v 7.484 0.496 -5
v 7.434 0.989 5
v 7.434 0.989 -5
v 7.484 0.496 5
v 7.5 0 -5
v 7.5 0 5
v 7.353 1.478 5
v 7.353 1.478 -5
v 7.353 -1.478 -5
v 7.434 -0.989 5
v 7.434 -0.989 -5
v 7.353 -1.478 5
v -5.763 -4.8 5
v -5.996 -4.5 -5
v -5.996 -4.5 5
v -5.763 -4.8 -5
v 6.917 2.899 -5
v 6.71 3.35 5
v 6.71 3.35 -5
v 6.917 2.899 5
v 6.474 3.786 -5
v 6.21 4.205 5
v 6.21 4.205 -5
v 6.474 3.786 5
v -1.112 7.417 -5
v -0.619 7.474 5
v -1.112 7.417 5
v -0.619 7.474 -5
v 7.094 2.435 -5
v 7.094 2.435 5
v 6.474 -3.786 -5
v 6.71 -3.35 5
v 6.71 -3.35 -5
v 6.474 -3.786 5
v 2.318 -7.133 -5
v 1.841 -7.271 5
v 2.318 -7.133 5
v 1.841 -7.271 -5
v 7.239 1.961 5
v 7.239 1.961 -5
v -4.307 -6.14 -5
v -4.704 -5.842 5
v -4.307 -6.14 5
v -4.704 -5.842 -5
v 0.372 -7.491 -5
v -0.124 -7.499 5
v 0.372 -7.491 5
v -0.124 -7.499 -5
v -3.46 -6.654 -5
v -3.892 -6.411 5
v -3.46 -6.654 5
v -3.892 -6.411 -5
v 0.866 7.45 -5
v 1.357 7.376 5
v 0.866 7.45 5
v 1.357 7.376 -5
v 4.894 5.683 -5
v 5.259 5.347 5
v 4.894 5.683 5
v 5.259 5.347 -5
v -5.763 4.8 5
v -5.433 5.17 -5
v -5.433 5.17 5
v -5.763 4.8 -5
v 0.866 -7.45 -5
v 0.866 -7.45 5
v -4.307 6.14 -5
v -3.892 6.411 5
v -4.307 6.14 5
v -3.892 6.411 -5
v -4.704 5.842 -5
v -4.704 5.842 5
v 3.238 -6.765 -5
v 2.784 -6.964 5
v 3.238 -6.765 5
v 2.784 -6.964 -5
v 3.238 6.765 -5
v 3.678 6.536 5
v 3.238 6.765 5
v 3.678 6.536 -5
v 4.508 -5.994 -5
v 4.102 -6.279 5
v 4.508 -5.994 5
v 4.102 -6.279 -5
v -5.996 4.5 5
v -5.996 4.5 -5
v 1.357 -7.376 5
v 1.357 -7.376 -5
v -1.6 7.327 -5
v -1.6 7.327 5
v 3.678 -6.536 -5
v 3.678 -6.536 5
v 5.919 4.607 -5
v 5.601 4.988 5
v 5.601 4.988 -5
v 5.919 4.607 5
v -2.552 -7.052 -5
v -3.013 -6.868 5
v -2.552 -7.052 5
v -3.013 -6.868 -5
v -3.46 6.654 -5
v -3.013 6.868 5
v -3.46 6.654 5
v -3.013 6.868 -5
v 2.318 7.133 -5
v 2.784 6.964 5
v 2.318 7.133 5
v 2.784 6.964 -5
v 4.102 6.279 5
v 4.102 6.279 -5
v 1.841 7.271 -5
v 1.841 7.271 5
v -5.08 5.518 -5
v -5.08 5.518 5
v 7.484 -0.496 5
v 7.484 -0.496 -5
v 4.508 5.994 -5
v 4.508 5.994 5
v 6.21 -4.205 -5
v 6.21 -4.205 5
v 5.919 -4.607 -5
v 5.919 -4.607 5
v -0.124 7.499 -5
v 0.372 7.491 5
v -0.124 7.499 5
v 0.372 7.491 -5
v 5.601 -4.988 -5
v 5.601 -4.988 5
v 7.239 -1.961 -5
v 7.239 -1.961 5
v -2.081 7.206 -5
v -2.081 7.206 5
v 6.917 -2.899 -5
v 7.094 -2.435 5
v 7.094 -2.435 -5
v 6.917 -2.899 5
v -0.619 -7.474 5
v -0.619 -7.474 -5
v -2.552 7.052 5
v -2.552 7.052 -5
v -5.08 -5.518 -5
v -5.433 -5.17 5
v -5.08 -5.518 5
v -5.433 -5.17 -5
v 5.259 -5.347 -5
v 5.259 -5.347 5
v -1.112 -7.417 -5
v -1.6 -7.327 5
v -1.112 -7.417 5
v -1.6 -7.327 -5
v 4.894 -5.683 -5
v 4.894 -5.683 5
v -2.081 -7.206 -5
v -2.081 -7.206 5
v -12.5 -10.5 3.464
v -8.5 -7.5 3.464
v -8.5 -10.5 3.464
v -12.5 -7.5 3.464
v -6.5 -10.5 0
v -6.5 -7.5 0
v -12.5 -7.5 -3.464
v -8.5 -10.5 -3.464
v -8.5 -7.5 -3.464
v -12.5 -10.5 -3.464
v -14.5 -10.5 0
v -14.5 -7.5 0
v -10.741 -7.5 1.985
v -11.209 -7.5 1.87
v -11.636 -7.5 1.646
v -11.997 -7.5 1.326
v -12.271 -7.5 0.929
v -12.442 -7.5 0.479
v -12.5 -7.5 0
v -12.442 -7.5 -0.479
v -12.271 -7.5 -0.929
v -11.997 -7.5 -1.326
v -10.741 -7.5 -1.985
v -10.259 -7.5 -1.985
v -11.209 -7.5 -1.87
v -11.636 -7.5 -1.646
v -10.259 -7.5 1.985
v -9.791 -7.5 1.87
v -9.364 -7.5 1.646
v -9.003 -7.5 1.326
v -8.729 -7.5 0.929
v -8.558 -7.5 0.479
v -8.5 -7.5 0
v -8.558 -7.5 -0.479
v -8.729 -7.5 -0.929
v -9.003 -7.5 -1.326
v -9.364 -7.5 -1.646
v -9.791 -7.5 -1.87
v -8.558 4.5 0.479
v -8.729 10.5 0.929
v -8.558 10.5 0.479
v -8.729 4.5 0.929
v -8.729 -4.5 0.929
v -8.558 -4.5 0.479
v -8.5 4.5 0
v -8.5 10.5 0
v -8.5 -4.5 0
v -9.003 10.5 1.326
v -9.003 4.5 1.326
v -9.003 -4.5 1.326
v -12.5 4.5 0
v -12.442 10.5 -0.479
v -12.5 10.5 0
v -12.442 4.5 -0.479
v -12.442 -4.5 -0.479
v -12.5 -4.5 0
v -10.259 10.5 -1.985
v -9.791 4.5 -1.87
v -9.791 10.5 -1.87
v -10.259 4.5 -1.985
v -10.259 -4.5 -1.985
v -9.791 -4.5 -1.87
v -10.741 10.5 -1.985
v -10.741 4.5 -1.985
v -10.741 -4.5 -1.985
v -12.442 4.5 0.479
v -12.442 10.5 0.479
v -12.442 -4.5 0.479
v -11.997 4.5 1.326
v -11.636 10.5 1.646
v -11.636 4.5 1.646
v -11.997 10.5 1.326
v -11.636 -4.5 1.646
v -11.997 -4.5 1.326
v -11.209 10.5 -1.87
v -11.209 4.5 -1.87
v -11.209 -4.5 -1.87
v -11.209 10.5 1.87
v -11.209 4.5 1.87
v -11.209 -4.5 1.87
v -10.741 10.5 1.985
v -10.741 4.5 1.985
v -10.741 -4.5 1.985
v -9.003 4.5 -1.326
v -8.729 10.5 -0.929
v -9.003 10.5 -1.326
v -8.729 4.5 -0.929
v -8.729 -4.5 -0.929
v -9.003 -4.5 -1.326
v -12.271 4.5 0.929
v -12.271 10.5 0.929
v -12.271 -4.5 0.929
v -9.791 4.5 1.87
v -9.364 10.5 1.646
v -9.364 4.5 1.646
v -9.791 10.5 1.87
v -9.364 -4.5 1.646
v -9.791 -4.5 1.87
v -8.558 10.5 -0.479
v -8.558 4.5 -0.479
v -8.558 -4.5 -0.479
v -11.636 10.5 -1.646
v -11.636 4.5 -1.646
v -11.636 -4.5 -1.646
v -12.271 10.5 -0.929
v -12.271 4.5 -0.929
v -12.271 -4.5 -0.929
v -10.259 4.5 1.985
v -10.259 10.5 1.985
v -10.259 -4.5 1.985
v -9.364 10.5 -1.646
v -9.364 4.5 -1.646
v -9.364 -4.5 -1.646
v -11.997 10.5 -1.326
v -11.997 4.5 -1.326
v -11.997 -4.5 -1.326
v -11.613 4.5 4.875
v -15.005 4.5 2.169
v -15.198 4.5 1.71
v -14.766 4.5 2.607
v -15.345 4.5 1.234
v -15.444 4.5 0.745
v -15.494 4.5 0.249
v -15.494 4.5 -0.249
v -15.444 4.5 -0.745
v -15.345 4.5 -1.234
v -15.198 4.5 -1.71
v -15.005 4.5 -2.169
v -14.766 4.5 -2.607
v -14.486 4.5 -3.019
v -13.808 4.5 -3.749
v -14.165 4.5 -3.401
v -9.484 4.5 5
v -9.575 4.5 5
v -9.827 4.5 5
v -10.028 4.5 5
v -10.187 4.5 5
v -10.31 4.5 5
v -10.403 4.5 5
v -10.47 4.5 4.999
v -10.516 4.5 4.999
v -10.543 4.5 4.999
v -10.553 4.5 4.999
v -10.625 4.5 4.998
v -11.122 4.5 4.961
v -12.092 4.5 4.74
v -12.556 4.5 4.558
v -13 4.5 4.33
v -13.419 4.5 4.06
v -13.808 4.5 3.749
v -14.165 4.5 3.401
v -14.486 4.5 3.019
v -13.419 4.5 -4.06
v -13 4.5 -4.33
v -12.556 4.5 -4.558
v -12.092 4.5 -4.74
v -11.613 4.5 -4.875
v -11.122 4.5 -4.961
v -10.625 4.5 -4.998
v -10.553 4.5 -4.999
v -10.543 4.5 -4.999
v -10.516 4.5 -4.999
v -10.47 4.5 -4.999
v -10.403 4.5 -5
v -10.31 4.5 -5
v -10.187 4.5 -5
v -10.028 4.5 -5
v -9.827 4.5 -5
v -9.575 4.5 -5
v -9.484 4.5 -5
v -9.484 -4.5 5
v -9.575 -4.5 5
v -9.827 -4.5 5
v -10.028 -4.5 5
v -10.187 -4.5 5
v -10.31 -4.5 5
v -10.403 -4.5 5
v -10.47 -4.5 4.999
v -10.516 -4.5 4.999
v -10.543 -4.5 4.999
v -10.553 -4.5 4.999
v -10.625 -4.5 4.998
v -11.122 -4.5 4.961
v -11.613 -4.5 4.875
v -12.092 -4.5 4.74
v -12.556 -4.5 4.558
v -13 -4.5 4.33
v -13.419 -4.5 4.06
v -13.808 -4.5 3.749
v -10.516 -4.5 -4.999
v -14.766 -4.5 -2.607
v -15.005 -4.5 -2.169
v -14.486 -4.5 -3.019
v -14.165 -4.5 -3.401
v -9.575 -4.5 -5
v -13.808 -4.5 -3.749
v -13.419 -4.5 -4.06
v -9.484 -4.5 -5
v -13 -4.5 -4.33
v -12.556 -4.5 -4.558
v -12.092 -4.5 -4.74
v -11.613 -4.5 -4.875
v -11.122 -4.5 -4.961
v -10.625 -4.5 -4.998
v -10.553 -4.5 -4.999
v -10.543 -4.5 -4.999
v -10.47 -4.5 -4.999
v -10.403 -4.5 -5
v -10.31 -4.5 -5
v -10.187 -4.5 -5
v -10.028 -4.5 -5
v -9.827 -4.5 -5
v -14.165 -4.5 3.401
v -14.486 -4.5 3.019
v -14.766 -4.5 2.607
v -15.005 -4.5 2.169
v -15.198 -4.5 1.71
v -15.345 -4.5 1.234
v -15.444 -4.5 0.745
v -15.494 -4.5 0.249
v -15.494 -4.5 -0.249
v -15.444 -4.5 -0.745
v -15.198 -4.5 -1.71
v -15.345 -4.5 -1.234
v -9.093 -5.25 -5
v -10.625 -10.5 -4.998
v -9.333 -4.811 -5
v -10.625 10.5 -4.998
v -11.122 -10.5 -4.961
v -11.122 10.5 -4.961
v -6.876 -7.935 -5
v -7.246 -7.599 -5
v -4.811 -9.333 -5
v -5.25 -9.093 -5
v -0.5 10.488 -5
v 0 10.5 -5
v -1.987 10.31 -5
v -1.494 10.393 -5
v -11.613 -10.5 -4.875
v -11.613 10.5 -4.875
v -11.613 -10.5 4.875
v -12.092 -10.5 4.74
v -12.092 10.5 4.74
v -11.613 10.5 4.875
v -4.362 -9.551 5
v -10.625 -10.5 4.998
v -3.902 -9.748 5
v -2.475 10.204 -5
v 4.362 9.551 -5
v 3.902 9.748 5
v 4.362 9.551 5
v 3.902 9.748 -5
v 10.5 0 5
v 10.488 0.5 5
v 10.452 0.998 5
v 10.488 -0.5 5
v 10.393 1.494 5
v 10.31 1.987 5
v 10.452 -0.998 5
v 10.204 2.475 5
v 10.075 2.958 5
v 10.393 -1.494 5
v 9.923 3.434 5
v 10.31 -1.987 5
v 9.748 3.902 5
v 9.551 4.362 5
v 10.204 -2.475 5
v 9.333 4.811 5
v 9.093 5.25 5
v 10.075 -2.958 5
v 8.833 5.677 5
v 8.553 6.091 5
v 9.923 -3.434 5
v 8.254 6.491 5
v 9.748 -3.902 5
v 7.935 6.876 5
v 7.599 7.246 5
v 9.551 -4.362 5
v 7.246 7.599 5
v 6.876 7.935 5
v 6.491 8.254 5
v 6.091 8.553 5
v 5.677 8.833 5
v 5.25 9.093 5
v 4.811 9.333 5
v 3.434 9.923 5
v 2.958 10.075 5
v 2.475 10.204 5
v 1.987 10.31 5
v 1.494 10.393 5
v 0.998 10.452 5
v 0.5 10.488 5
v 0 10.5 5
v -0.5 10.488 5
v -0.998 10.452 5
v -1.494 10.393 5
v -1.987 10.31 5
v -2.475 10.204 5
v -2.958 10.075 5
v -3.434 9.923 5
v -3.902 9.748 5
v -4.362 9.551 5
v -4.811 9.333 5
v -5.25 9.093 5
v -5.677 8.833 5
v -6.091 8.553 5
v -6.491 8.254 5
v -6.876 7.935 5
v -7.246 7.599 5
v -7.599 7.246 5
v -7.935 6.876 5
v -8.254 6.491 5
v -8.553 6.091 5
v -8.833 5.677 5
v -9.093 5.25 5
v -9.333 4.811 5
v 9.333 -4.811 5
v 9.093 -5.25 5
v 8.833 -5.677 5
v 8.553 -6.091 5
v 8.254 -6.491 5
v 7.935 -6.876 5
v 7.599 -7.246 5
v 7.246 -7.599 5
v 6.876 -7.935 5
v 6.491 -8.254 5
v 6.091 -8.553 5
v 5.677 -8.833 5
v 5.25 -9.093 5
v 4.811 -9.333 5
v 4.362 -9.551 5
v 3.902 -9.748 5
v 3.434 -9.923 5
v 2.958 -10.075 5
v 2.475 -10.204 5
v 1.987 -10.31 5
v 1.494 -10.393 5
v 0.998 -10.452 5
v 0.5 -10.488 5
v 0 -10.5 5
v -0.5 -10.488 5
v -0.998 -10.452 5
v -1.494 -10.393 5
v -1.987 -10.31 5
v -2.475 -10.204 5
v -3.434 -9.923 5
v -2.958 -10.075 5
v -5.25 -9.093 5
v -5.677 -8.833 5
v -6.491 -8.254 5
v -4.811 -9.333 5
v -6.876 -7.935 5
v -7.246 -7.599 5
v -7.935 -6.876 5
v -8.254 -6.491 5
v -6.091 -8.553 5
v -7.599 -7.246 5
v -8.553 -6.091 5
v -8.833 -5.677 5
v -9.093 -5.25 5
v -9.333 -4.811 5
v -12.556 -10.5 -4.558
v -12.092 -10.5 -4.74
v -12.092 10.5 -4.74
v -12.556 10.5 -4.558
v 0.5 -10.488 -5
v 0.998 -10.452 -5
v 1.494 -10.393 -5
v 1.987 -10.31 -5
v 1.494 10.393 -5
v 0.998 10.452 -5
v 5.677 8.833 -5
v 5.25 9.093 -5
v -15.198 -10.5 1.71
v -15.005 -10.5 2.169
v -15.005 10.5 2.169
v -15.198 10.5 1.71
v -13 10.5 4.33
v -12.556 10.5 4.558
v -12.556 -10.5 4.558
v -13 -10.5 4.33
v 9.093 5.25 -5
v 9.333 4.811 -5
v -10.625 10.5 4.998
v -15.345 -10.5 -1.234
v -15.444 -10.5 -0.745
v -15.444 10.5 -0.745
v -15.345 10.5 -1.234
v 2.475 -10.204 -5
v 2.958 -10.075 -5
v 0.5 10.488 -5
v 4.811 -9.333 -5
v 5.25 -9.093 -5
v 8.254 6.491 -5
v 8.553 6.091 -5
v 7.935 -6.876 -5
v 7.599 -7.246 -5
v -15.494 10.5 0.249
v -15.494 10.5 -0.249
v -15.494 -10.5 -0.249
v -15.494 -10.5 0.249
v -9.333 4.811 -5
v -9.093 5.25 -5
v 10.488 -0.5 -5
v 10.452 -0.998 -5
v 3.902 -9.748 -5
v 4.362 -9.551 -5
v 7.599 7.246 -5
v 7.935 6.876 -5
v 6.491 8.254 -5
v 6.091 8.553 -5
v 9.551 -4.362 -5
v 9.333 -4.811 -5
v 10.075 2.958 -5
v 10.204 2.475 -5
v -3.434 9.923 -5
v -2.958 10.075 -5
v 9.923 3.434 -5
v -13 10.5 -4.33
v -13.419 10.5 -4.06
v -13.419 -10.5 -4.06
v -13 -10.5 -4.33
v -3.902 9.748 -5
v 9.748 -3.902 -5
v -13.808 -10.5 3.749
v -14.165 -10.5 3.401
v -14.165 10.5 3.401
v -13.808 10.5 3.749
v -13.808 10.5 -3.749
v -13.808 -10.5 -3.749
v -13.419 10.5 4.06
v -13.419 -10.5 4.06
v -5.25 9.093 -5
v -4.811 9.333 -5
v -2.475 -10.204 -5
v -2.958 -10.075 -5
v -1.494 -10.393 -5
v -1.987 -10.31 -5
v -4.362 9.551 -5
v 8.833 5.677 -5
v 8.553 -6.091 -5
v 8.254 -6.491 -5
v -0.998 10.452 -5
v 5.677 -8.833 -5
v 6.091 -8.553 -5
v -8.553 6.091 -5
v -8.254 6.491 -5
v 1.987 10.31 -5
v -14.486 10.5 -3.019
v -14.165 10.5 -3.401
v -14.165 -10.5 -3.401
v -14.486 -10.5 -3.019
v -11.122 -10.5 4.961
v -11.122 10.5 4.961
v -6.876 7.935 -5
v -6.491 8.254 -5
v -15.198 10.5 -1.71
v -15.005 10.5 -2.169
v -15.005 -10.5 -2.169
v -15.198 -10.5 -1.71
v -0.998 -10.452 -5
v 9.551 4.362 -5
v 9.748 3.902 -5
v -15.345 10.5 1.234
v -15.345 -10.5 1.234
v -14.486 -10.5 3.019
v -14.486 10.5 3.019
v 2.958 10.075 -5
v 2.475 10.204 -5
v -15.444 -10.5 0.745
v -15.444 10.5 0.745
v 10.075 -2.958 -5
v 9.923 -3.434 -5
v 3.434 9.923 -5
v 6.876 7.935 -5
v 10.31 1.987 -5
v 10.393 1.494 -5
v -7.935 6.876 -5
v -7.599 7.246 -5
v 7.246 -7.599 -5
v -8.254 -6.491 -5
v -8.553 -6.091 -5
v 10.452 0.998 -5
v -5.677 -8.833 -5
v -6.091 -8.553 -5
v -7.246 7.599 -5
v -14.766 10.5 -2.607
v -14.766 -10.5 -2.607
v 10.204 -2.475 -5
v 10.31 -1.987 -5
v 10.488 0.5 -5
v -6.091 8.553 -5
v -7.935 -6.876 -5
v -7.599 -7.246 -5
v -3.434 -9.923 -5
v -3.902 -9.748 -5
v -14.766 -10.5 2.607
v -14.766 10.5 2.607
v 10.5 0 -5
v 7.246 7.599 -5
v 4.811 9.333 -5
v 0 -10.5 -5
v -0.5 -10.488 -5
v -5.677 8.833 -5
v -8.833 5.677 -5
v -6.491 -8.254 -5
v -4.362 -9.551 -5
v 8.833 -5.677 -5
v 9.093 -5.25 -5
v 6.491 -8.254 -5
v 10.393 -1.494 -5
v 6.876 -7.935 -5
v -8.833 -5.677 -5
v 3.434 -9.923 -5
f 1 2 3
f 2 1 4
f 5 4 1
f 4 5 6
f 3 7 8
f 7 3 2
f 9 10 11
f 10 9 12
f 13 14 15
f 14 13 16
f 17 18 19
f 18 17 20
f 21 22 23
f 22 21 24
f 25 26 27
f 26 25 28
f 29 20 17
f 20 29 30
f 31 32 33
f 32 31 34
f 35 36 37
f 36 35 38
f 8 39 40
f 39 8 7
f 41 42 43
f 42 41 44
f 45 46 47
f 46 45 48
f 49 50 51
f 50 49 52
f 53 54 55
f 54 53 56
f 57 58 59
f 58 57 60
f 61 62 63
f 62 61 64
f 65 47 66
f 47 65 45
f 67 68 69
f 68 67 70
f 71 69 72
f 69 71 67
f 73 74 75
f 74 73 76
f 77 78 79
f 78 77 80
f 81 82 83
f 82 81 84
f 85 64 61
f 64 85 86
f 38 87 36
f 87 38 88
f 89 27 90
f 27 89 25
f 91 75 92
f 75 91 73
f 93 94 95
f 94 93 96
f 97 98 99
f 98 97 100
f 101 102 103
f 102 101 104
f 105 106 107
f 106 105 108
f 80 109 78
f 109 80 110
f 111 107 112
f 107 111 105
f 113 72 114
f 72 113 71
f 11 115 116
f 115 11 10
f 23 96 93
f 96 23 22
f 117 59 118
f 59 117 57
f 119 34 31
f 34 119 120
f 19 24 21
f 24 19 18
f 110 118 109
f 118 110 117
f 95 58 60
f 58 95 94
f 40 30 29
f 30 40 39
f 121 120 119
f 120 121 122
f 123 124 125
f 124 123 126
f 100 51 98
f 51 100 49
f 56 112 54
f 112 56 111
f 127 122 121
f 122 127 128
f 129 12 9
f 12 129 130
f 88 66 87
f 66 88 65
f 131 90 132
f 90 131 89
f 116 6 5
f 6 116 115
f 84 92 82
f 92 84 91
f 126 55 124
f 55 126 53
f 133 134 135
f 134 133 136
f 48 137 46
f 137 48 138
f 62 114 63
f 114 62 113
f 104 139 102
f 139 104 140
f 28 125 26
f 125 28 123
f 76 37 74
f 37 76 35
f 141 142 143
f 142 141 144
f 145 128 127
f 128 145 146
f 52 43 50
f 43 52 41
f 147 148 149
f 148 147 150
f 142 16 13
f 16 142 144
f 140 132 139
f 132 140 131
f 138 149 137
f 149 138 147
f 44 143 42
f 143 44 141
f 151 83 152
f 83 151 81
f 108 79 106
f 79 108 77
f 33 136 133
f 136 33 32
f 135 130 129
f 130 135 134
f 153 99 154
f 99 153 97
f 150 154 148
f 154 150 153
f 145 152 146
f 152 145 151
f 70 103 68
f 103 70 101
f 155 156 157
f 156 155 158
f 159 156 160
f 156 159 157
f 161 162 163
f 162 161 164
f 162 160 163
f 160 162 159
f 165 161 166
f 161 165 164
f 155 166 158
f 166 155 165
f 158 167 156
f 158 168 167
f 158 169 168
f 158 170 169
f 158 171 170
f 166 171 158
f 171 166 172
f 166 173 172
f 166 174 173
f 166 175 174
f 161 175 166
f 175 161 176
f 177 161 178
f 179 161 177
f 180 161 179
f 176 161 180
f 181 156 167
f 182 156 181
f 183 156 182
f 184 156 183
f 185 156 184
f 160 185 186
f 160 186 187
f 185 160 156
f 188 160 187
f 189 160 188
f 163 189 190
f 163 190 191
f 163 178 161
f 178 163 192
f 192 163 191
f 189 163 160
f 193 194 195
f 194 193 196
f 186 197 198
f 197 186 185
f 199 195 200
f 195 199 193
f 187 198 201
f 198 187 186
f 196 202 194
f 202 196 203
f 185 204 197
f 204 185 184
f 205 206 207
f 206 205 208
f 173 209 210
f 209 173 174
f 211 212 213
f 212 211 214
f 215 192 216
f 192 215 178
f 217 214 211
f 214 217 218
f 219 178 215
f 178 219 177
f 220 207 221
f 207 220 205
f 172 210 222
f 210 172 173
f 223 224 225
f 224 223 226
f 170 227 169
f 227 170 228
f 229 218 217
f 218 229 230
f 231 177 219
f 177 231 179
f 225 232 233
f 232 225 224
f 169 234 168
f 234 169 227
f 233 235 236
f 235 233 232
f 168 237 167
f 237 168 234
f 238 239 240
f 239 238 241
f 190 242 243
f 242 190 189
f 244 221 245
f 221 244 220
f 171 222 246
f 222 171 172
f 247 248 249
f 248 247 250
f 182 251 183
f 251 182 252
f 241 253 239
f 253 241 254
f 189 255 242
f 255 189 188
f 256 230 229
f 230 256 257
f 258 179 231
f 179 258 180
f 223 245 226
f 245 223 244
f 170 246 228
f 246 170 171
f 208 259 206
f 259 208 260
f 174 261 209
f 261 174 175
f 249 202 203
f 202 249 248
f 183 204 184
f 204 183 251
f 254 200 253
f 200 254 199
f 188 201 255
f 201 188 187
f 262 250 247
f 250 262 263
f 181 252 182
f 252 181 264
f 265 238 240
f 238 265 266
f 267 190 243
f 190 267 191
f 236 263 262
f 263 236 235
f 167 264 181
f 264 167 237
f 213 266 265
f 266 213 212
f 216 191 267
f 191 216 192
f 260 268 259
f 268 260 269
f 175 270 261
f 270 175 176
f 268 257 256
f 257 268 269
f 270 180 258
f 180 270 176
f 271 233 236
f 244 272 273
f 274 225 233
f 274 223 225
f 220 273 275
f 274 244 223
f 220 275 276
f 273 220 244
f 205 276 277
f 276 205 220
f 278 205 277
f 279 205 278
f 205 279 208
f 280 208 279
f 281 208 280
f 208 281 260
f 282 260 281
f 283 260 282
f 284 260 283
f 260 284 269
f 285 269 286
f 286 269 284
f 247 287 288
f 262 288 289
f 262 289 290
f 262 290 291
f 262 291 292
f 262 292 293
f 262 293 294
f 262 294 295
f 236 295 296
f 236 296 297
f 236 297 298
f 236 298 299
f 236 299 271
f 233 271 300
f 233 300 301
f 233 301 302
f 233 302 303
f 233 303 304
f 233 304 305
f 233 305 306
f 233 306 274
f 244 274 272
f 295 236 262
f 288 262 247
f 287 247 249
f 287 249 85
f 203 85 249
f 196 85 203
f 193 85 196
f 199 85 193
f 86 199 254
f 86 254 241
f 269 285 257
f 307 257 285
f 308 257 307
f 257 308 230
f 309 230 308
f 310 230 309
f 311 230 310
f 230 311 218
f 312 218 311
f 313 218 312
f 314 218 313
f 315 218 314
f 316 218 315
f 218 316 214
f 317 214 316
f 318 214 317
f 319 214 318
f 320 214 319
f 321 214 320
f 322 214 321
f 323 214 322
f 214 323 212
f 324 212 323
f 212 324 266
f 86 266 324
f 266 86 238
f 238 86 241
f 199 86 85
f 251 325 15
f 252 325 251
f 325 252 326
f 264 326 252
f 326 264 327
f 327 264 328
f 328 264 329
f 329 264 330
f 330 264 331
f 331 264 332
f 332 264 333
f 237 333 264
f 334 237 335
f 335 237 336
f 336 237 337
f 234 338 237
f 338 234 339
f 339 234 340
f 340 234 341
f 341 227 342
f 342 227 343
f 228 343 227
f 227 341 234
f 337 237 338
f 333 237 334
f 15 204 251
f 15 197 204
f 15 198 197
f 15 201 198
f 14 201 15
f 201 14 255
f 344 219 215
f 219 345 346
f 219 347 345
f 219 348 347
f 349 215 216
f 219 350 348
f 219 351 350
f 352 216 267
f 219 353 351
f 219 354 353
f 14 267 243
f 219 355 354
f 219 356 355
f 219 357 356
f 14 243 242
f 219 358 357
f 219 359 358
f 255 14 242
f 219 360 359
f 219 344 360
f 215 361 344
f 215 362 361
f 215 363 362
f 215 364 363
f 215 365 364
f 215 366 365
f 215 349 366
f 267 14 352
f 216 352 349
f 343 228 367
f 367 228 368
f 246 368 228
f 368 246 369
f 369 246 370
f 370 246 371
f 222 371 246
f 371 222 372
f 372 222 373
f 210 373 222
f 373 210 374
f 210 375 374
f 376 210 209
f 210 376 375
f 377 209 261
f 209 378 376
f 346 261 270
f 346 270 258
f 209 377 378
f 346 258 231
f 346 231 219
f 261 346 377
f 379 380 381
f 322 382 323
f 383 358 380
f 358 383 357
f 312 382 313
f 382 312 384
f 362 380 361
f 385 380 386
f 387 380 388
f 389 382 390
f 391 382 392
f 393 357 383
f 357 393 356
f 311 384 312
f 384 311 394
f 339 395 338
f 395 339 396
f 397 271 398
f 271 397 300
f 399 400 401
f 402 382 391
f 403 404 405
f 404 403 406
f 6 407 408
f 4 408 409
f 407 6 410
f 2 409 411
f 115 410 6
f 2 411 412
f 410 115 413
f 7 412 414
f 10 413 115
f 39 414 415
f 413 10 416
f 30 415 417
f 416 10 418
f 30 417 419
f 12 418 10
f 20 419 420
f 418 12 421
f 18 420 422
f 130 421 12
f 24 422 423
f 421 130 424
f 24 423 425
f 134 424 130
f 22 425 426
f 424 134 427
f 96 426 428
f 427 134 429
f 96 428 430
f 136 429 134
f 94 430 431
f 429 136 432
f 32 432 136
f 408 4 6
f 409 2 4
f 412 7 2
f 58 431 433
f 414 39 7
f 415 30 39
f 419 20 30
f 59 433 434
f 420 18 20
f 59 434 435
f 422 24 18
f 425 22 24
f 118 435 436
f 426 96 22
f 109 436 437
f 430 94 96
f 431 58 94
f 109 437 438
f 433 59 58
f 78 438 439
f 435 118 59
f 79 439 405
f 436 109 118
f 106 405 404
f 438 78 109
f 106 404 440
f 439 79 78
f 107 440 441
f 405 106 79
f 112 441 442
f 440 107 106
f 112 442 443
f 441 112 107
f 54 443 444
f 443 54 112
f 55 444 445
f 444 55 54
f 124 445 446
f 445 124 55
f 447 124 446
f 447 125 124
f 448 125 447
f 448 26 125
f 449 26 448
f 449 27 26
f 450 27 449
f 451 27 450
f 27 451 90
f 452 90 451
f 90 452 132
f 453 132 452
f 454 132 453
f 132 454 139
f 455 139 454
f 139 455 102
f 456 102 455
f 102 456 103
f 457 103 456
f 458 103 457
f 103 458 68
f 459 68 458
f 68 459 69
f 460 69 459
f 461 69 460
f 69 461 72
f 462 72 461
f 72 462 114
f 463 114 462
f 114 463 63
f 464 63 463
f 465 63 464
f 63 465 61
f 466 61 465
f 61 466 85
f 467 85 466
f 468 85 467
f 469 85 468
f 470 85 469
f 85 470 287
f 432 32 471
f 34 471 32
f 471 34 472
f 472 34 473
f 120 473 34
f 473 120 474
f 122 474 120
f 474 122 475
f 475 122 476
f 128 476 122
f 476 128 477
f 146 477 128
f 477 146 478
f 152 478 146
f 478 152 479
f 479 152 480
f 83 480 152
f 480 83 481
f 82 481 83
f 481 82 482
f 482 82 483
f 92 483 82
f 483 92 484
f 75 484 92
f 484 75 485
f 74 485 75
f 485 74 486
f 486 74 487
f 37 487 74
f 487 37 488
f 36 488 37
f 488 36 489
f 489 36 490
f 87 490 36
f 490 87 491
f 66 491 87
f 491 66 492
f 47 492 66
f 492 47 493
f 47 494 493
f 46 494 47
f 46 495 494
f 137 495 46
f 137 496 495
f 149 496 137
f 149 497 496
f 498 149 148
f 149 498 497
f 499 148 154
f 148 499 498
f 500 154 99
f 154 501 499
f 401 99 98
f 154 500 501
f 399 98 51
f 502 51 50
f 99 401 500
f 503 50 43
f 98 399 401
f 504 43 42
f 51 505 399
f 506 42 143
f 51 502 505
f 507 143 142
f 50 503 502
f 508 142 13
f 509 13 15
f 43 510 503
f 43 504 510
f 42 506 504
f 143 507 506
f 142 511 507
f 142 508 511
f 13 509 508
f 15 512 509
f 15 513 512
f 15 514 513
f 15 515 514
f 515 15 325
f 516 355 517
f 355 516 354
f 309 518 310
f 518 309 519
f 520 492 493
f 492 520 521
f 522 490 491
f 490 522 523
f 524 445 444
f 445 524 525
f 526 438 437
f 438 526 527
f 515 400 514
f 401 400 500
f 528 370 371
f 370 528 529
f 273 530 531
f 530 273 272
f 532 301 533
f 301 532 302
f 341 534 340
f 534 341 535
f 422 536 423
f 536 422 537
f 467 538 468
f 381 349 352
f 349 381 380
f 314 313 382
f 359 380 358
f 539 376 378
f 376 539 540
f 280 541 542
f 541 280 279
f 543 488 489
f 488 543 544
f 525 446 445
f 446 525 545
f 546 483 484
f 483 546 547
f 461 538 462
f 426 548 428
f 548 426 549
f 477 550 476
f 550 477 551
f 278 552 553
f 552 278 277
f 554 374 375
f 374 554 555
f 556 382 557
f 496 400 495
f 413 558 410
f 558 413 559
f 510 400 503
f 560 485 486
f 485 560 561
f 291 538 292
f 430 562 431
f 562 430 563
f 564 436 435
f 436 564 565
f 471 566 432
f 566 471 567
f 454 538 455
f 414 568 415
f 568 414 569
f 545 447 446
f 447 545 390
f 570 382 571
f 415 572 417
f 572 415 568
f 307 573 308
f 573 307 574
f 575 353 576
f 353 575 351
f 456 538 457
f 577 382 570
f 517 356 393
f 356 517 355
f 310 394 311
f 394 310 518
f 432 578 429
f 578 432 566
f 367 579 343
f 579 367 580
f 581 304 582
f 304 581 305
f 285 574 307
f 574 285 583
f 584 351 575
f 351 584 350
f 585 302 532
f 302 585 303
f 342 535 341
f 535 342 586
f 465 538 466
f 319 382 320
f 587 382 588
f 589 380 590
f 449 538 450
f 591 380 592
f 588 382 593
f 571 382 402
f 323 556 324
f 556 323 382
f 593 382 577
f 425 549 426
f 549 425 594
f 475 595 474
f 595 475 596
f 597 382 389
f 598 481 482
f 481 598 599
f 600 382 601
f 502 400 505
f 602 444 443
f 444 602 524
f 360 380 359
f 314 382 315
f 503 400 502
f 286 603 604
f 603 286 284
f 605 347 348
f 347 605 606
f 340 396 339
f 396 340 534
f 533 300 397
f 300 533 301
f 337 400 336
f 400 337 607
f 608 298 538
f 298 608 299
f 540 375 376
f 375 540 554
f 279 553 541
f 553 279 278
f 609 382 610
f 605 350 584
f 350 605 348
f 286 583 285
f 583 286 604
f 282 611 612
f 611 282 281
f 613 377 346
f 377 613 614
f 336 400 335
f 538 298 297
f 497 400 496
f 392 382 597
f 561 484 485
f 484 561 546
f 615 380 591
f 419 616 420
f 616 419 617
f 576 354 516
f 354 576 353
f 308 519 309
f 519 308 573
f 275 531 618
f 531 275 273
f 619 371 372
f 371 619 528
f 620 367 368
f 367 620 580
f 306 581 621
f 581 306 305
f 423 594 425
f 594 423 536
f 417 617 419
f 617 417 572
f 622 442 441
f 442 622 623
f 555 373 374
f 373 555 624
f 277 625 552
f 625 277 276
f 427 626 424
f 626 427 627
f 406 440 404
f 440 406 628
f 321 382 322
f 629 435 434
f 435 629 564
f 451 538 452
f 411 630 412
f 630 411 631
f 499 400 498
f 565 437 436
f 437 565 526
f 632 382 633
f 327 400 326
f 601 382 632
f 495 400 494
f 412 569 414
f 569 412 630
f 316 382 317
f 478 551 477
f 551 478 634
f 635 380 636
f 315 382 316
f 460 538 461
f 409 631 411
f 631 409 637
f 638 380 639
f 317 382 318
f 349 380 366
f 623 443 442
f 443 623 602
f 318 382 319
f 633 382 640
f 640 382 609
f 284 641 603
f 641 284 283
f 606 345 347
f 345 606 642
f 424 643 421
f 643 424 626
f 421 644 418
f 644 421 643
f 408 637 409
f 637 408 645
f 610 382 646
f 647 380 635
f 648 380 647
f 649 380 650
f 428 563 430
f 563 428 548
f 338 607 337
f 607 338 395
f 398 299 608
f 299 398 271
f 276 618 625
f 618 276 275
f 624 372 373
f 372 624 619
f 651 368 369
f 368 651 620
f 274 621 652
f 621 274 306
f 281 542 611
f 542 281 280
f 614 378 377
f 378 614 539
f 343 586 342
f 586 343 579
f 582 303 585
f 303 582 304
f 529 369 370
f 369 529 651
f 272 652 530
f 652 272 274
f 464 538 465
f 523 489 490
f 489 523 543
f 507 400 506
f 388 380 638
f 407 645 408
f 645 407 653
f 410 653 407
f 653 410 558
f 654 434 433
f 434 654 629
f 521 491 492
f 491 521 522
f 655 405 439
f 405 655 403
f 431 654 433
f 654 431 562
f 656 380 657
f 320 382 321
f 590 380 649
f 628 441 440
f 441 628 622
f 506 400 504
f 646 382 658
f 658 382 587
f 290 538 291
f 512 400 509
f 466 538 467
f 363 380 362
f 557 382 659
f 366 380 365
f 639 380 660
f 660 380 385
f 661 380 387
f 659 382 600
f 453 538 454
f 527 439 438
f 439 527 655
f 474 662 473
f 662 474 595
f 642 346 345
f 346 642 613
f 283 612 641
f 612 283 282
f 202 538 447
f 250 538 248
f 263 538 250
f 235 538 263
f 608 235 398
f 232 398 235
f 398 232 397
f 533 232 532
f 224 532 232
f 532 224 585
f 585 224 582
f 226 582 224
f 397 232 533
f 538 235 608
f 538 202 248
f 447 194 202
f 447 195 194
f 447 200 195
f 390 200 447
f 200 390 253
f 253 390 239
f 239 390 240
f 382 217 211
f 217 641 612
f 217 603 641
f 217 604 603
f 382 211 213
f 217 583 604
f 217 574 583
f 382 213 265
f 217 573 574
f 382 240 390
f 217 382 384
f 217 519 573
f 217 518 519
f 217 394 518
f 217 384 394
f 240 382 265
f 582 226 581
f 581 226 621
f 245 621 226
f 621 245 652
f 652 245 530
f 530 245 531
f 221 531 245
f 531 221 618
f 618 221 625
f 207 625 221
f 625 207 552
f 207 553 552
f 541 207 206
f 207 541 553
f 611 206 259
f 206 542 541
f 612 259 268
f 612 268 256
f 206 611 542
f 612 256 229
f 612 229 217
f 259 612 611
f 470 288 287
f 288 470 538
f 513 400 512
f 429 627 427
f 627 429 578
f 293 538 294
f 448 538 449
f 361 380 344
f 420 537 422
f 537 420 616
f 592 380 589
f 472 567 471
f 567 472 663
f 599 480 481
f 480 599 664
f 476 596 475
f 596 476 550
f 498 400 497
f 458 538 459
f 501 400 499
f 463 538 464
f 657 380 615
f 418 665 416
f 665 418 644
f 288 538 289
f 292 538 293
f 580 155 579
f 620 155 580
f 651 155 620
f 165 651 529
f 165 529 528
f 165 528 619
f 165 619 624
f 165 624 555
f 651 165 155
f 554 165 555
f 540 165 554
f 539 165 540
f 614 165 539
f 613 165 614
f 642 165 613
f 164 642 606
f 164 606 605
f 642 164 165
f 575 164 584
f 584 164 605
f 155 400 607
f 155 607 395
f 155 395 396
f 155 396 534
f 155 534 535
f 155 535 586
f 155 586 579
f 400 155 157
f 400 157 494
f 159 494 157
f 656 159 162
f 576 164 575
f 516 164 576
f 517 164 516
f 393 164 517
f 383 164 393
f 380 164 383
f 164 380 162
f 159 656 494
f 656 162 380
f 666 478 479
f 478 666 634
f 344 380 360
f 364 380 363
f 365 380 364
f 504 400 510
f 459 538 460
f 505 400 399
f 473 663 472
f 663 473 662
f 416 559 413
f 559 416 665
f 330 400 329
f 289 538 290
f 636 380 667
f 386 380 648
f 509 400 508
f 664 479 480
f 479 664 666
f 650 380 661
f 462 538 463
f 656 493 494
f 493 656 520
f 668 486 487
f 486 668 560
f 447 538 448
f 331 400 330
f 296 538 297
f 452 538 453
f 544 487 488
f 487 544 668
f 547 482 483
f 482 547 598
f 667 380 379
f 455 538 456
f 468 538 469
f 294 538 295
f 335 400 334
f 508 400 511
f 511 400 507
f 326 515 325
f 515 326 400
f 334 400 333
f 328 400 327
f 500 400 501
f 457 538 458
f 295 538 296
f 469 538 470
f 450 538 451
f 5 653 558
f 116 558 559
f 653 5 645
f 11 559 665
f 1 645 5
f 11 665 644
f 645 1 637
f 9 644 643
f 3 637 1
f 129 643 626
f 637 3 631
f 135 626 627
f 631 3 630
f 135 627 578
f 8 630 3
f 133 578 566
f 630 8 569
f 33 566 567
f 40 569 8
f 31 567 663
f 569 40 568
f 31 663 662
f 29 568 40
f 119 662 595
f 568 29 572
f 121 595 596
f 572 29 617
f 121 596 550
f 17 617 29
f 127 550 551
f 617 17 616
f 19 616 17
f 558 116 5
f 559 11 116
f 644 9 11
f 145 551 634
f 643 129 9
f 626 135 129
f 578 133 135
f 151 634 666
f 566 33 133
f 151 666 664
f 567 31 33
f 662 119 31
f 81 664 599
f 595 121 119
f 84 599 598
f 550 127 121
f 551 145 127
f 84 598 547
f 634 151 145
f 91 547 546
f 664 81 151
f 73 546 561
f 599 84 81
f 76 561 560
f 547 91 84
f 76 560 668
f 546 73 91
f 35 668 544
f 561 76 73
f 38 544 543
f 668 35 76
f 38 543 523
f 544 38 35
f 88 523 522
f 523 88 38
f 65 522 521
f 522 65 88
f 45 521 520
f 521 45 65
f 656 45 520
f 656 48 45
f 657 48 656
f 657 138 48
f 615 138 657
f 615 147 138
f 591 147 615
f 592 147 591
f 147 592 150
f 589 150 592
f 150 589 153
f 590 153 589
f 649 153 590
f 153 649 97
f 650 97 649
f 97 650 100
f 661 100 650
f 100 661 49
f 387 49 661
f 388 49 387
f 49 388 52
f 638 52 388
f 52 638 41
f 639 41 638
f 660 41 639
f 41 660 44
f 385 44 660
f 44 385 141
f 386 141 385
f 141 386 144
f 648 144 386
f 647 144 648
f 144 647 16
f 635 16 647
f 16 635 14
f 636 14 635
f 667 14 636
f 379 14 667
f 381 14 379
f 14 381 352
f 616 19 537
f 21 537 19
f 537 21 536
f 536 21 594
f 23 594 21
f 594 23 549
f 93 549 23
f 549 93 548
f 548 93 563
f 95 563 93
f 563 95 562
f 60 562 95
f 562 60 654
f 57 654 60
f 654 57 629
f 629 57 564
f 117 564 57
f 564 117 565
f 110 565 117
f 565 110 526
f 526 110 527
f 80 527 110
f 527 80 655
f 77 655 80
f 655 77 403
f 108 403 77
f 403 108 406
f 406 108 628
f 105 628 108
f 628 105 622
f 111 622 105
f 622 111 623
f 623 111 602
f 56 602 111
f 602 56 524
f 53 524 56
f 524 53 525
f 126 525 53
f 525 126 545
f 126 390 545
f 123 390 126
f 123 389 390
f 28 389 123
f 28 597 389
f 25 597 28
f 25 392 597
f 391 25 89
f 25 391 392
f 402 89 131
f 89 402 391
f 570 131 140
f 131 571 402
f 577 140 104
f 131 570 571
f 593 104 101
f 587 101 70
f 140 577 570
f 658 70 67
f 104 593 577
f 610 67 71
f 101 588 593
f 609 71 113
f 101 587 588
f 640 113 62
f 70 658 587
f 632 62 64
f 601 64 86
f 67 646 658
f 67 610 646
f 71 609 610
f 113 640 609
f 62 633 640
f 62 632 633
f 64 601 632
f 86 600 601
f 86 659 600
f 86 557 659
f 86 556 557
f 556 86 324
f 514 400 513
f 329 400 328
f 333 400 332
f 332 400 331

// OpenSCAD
// Double clamps for mounting stuff on camera rails
// Customizations allow to use this single parametric model to generate most of
// the rail mounts for my rig. Make neighboring tightener thumb screws face
// different directions for ease of their use in otherwise tight space Mount
// objects above or below the clamp Move the mounting height by changing the
// position of connecting bar between rail clamps Coupling option allows to
// attach Hirth joint rosette and use it for example for clamping to another
// tube I'm using m4 screws in 10x10mm grid in my diy rigs, if you want more
// standard 1/4" screws with 9x9mm grid just change d_bolt to 6.5 and
// hole_distance to 9
$fa = 1 / 1;
$fs = 1 / 2;
bissl = 1 / 100;
part = "single_clamp";//[double_clamp,double_clamp_side,double_clamp_double_mount,lens_suppoprt_clamp,lens_support]
/* [hardware size] */
d_tube = 15;
h_ring = 10;
d_bolt = 4;
d_nut = 8;
h_nut = 3;
/* [coupling size] */
coupling = false;
bcd = 10;
n_screws = 4;
d_circle = 2;
/* [general part parameters] */
wall = 3;
offset = 1;
center_to_center = 60;
bar_thickness = 6;
n_holes = 3;
hole_distance = 10;
/* [lens support] */
range = 30;
width = 20;
maxlens = 82;
/* [part shape tweaks] */
nut = true;
invert_nut_side = false;
tightener_facing = "up"; //[down,side,diagonally_up,diagonally_down,diagonally_inwards]
angle = tightener_facing == "up"                   ? 180
        : tightener_facing == "diagonally_up"      ? 135
        : tightener_facing == "side"               ? 90
        : tightener_facing == "diagonally_down"    ? 45
        : tightener_facing == "down"               ? 0
        : tightener_facing == "diagonally_inwards" ? -150
                                                   : undef;
nut_side_up =
    (tightener_facing == "up" || tightener_facing == "diagonally_up" ||
     tightener_facing == "diagonally_inwards");
reflections = invert_nut_side ? [ !nut_side_up, nut_side_up ]
                              : [ nut_side_up, !nut_side_up ];
orientations = [ -angle, angle ];
bar_position = "low";  //[mid,up,just_clear_nut]
mount_object = "down"; //[up,down]
bar_orientation = mount_object == "down" ? 180
                  : mount_object == "up" ? 0
                                         : undef;
bar_offset =
    bar_position == "low"   ? bar_thickness / 2 - d_tube / 2 - wall
    : bar_position == "mid" ? 0
    : bar_position == "up"  ? -bar_thickness / 2 + d_tube / 2 + wall
    : nut_side_up
        ? d_tube / 2 + offset + d_bolt / 2 - d_nut / 2 - bar_thickness / 2
        : -d_tube / 2 - offset - d_bolt / 2 + d_nut / 2 + bar_thickness / 2;

module single_clamp() {
  difference() {
    union() {
      hull() {
        translate([ d_tube / 2, 0, 0 ])
            cylinder(h = h_ring, d = d_tube + 2 * wall, center = true);
        translate([ -d_bolt / 2 - offset, 0, 0 ]) rotate([ 90, 0, 0 ])
            cylinder(h = d_tube + 2 * wall, d = h_ring, center = true);
      }
    }
    translate([ d_tube / 2, 0, 0 ])
        cylinder(h = d_tube + 2 * wall + bissl, d = d_tube, center = true);
    if (nut)
      translate([ -d_bolt / 2 - offset, -d_tube / 2, 0 ]) rotate([ 90, 0, 0 ])
          cylinder(h = d_tube + 2 * wall + bissl, d = d_nut, $fn = 6);
    if (coupling)
      translate([ -d_bolt / 2 - offset, d_tube / 2 + wall, 0 ])
          rotate([ 90, 0, 0 ]) for (i = [180 / n_screws:360 / n_screws:360])
              rotate([ 0, 0, i ]) translate([ bcd / 2, 0, -0.01 ])
                  cylinder(h = 2 * wall + 0.02, d = d_circle);
    translate([ -d_bolt / 2 - offset, 0, 0 ]) rotate([ 90, 0, 0 ])
        cylinder(h = d_tube + 2 * wall + bissl, d = d_bolt, center = true);
    translate([
      -d_bolt / 2 - h_ring / 2 - bissl - offset, -d_tube / 2 + wall,
      -h_ring / 2 -
      bissl
    ])
        cube([
          d_bolt / 2 + h_ring / 2 + d_tube / 2 + offset, d_tube - 2 * wall,
          h_ring + 2 *
          bissl
        ]);
  }
}
module double_clamp() {
  difference() {
    union() {
      hull() {
        translate([ d_tube / 2, 0, 0 ])
            cylinder(h = h_ring, d = d_tube + 2 * wall, center = true);
        translate([ -d_bolt / 2 - offset, 0, 0 ]) rotate([ 90, 0, 0 ])
            cylinder(h = d_tube + 2 * wall, d = h_ring, center = true);
      }
      translate([ 0, center_to_center, 0 ]) hull() {
        translate([ d_tube / 2, 0, 0 ])
            cylinder(h = h_ring, d = d_tube + 2 * wall, center = true);
        translate([ -d_bolt / 2 - offset, 0, 0 ]) rotate([ 90, 0, 0 ])
            cylinder(h = d_tube + 2 * wall, d = h_ring, center = true);
      }
      translate([ d_tube + wall - bar_thickness, 0, -h_ring / 2 ])
          cube([ bar_thickness, center_to_center, h_ring ]);
    }
    translate([ d_tube / 2, 0, 0 ])
        cylinder(h = d_tube + 2 * wall + bissl, d = d_tube, center = true);
    translate([ d_tube / 2, center_to_center, 0 ])
        cylinder(h = d_tube + 2 * wall + bissl, d = d_tube, center = true);
    if (nut)
      translate([ -d_bolt / 2 - offset, -d_tube / 2 + center_to_center, 0 ])
          rotate([ 90, 0, 0 ]) cylinder(h = wall + bissl, d = d_nut, $fn = 6);
    if (nut)
      translate([ -d_bolt / 2 - offset, d_tube / 2 + wall + bissl, 0 ])
          rotate([ 90, 0, 0 ]) cylinder(h = wall + bissl, d = d_nut, $fn = 6);
    translate([ -d_bolt / 2 - offset, 0, 0 ]) rotate([ 90, 0, 0 ])
        cylinder(h = d_tube + 2 * wall + bissl, d = d_bolt, center = true);
    translate([ -d_bolt / 2 - offset, center_to_center, 0 ])
        rotate([ 90, 0, 0 ])
            cylinder(h = d_tube + 2 * wall + bissl, d = d_bolt, center = true);
    translate([
      -d_bolt / 2 - h_ring / 2 - bissl - offset, -d_tube / 2 + wall,
      -h_ring / 2 -
      bissl
    ])
        cube([
          d_bolt / 2 + h_ring / 2 + d_tube / 2 + offset, d_tube - 2 * wall,
          h_ring + 2 *
          bissl
        ]);
    translate([
      -d_bolt / 2 - h_ring / 2 - bissl - offset,
      -d_tube / 2 + wall + center_to_center, -h_ring / 2 -
      bissl
    ])
        cube([
          d_bolt / 2 + h_ring / 2 + d_tube / 2 + offset, d_tube - 2 * wall,
          h_ring + 2 *
          bissl
        ]);
    for (i = [ 20, 30, 40 ]) {
      translate([ -bar_thickness + d_tube + wall - bissl, i, 0 ])
          rotate([ 90, 0, 90 ]) cylinder(d = d_nut, h = h_nut, $fn = 6);
      translate([ -bar_thickness + d_tube + wall - bissl, i, 0 ])
          rotate([ 90, 0, 90 ]) cylinder(d = d_bolt, bar_thickness + 2 * bissl);
    }
  }
}
module double_clamp_wall() {
  bar_thickness = 5;
  h_ring = 12;
  difference() {
    union() {
      hull() {
        translate([ d_tube / 2, 0, 0 ])
            cylinder(h = h_ring, d = d_tube + 2 * wall, center = true);
        translate([ -d_bolt / 2 - offset, 0, 0 ]) rotate([ 90, 0, 0 ])
            cylinder(h = d_tube + 2 * wall, d = h_ring, center = true);
      }
      translate([ 0, center_to_center, 0 ]) hull() {
        translate([ d_tube / 2, 0, 0 ])
            cylinder(h = h_ring, d = d_tube + 2 * wall, center = true);
        translate([ -d_bolt / 2 - offset, 0, 0 ]) rotate([ 90, 0, 0 ])
            cylinder(h = d_tube + 2 * wall, d = h_ring, center = true);
      }
      translate([ d_tube / 2, 0, -h_ring / 2 ]) hull() {
        for (t = [
               [ -85 + 31 + 5, 10, 0 ], [ -85 + 31 + 5, 50, 0 ], [ 0, 10, 0 ],
               [ 0, 50, 0 ]
             ])
          translate(t) cylinder(d = 10, h = bar_thickness);
      }
    }
    translate([ d_tube / 2, 0, -h_ring / 2 -
                bissl ]) for (t =
                                  [
                                    [ -85 + 31 + 5, 10, 0 ],
                                    [ -85 + 31 + 5, 30, 0 ],
                                    [ -85 + 31 + 5, 50, 0 ]
                                  ]) translate(t)
        cylinder(d = d_bolt, h = bar_thickness + 2 * bissl);

    translate([ d_tube / 2, 0, 0 ])
        cylinder(h = d_tube + 2 * wall + bissl, d = d_tube, center = true);
    translate([ d_tube / 2, center_to_center, 0 ])
        cylinder(h = d_tube + 2 * wall + bissl, d = d_tube, center = true);
    if (nut)
      translate([ -d_bolt / 2 - offset, -d_tube / 2 + center_to_center, 0 ])
          rotate([ 90, 0, 0 ])
              cylinder(h = wall + h_nut * 2, d = d_nut, $fn = 6);
    if (nut)
      translate([ -d_bolt / 2 - offset, d_tube / 2, 0 ]) rotate([ -90, 0, 0 ])
          cylinder(h = wall + h_nut * 2, d = d_nut, $fn = 6);
    translate([ -d_bolt / 2 - offset, 0, 0 ]) rotate([ 90, 0, 0 ])
        cylinder(h = d_tube + 2 * wall + bissl, d = d_bolt, center = true);
    translate([ -d_bolt / 2 - offset, center_to_center, 0 ])
        rotate([ 90, 0, 0 ])
            cylinder(h = d_tube + 2 * wall + bissl, d = d_bolt, center = true);
    translate([
      -d_bolt / 2 - h_ring / 2 - bissl - offset, -d_tube / 2 + wall,
      -h_ring / 2 -
      bissl
    ])
        cube([
          d_bolt / 2 + h_ring / 2 + d_tube / 2 + offset, d_tube - 2 * wall,
          h_ring + 2 *
          bissl
        ]);
    translate([
      -d_bolt / 2 - h_ring / 2 - bissl - offset,
      -d_tube / 2 + wall + center_to_center, -h_ring / 2 -
      bissl
    ])
        cube([
          d_bolt / 2 + h_ring / 2 + d_tube / 2 + offset, d_tube - 2 * wall,
          h_ring + 2 *
          bissl
        ]);
  }
}

module clamp_positive(d_tube = 16, h_ring = 12, wall = 3, d_bolt = 4,
                      offset = 1) {
  hull() {
    translate([ 0, 0, 0 ])
        cylinder(h = h_ring, d = d_tube + 2 * wall, center = true);
    translate([ -d_bolt / 2 - offset - d_tube / 2, 0, 0 ]) rotate([ 90, 0, 0 ])
        cylinder(h = d_tube + 2 * wall, d = h_ring, center = true);
  }
}

module clamp_negative(d_tube = 16, h_ring = 12, wall = 3, d_bolt = 4,
                      offset = 1, nut = true, d_nut = 8, coupling = false,
                      bcd = 10, n_screws = 4, d_circle = 2) {
  cylinder(h = d_tube + 2 * wall + bissl, d = d_tube, center = true);
  if (nut)
    translate(
        [ -d_bolt / 2 - offset - d_tube / 2, -wall - d_tube / 2 - bissl, 0 ])
        rotate([ -90, 0, 0 ]) cylinder(h = h_nut + bissl, d = d_nut, $fn = 6);
  if (coupling)
    translate([ -d_bolt / 2 - offset - d_tube / 2, d_tube / 2 + wall, 0 ])
        rotate([ 90, 0, 0 ]) for (i = [180 / n_screws:360 / n_screws:360])
            rotate([ 0, 0, i ]) translate([ bcd / 2, 0, -0.01 ])
                cylinder(h = 2 * wall + 0.02, d = d_circle);
  translate([ -d_bolt / 2 - offset - d_tube / 2, 0, 0 ]) rotate([ 90, 0, 0 ])
      cylinder(h = d_tube + 2 * wall + bissl, d = d_bolt, center = true);
  translate([
    -d_bolt / 2 - h_ring / 2 - bissl - offset - d_tube / 2, -d_tube / 2 + wall,
    -h_ring / 2 -
    bissl
  ])
      cube([
        d_bolt / 2 + h_ring / 2 + d_tube / 2 + offset, d_tube - 2 * wall,
        h_ring + 2 *
        bissl
      ]);
}
module clamp(d_tube = 16, h_ring = 12, wall = 3, d_bolt = 4, offset = 1,
             nut = true, d_nut = 8, coupling = false, bcd = 10, n_screws = 4,
             d_circle = 2) {
  difference() {
    clamp_positive(d_tube = d_tube, h_ring = h_ring, wall = wall,
                   d_bolt = d_bolt, offset = offset);
    clamp_negative(d_tube = d_tube, h_ring = h_ring, wall = wall,
                   d_bolt = d_bolt, offset = offset, nut = nut, d_nut = d_nut,
                   coupling = coupling, bcd = bcd, n_screws = n_screws,
                   d_circle = d_circle);
  }
}
module clamp_double(d_tube = 16, h_ring = 12, wall = 3, d_bolt = 4, offset = 1,
                    nut = true, d_nut = 8, h_nut = 4, coupling = false,
                    bcd = 10, n_screws = 4, d_circle = 2, center_to_center = 60,
                    orientations = [ 0, 0 ], reflections = [ false, true ],
                    bar_thickness = 8, bar_offset = 5, n_holes = 3,
                    hole_distance = 10, bar_orientation = 0) {
  difference() {
    union() {
      translate([ 0, center_to_center / 2, 0 ])
          rotate([ 0, 0, orientations[0] ])
              clamp_positive(d_tube = d_tube, h_ring = h_ring, wall = wall,
                             d_bolt = d_bolt, offset = offset);
      translate([ 0, -center_to_center / 2, 0 ])
          rotate([ 0, 0, orientations[1] ])
              clamp_positive(d_tube = d_tube, h_ring = h_ring, wall = wall,
                             d_bolt = d_bolt, offset = offset);
      translate([ bar_offset, 0, 0 ]) rotate([ 0, bar_orientation, 0 ]) bar(
          bar_thickness = bar_thickness, center_to_center = center_to_center,
          bar_width = h_ring, hole_distance = hole_distance, n_holes = n_holes,
          d_bolt = d_bolt, d_nut = d_nut, h_nut = h_nut);
    }
    translate([ 0, center_to_center / 2, 0 ]) rotate([ 0, 0, orientations[0] ])
        mirror([ 0, reflections[0] ? 1 : 0, 0 ])
            clamp_negative(d_tube = d_tube, h_ring = h_ring, wall = wall,
                           d_bolt = d_bolt, offset = offset, nut = nut,
                           d_nut = d_nut, coupling = coupling, bcd = bcd,
                           n_screws = n_screws, d_circle = d_circle);
    translate([ 0, -center_to_center / 2, 0 ]) rotate([ 0, 0, orientations[1] ])
        mirror([ 0, reflections[1] ? 1 : 0, 0 ])
            clamp_negative(d_tube = d_tube, h_ring = h_ring, wall = wall,
                           d_bolt = d_bolt, offset = offset, nut = nut,
                           d_nut = d_nut, coupling = coupling, bcd = bcd,
                           n_screws = n_screws, d_circle = d_circle);
  }
}
module bar(bar_thickness = 6, center_to_center = 60, bar_width = 16,
           hole_distance = 10, n_holes = 5, d_bolt = 4, d_nut = 8, h_nut = 4) {
  difference() {
    cube([ bar_thickness, center_to_center, bar_width ], center = true);
    for (t = [-hole_distance * (n_holes - 1) /
                         2:hole_distance:hole_distance * (n_holes - 1) / 2])
      translate([ 0, t, 0 ]) rotate([ 0, 90, 0 ]) {
        cylinder(h = bar_thickness + bissl, d = d_bolt, center = true);
        rotate([ 0, 0, 90 ]) translate([ 0, 0, -bar_thickness / 2 - bissl ])
            cylinder(h = h_nut + bissl, d = d_nut, $fn = 6);
      }
  }
}
module double_double_clamp(d_tube = 16, h_ring = 12, wall = 3, d_bolt = 4,
                           offset = 1, nut = true, d_nut = 8, h_nut = 4,
                           coupling = false, bcd = 10, n_screws = 4,
                           d_circle = 2, center_to_center = 60,
                           orientations = [ 0, 0 ],
                           reflections = [ false, true ], bar_thickness = 8,
                           second_bar_offset = 5, n_holes = 3,
                           hole_distance = 10) {
  difference() {
    union() {
      translate([ 0, center_to_center / 2, 0 ])
          rotate([ 0, 0, orientations[0] ])
              clamp_positive(d_tube = d_tube, h_ring = h_ring, wall = wall,
                             d_bolt = d_bolt, offset = offset);
      translate([ 0, -center_to_center / 2, 0 ])
          rotate([ 0, 0, orientations[1] ])
              clamp_positive(d_tube = d_tube, h_ring = h_ring, wall = wall,
                             d_bolt = d_bolt, offset = offset);
      translate([ bar_thickness / 2 - d_tube / 2 - wall, 0, 0 ])
          rotate([ 0, 180, 0 ])
              bar(bar_thickness = bar_thickness,
                  center_to_center = center_to_center, bar_width = h_ring,
                  hole_distance = hole_distance, n_holes = n_holes,
                  d_bolt = d_bolt, d_nut = d_nut, h_nut = h_nut);
      translate([ second_bar_offset, 0, 0 ]) rotate([ 0, 0, 0 ]) bar(
          bar_thickness = bar_thickness, center_to_center = center_to_center,
          bar_width = h_ring, hole_distance = hole_distance, n_holes = n_holes,
          d_bolt = d_bolt, d_nut = d_nut, h_nut = h_nut);
    }
    translate([ 0, center_to_center / 2, 0 ]) rotate([ 0, 0, orientations[0] ])
        mirror([ 0, reflections[0] ? 1 : 0, 0 ])
            clamp_negative(d_tube = d_tube, h_ring = h_ring, wall = wall,
                           d_bolt = d_bolt, offset = offset, nut = nut,
                           d_nut = d_nut, coupling = coupling, bcd = bcd,
                           n_screws = n_screws, d_circle = d_circle);
    translate([ 0, -center_to_center / 2, 0 ]) rotate([ 0, 0, orientations[1] ])
        mirror([ 0, reflections[1] ? 1 : 0, 0 ])
            clamp_negative(d_tube = d_tube, h_ring = h_ring, wall = wall,
                           d_bolt = d_bolt, offset = offset, nut = nut,
                           d_nut = d_nut, coupling = coupling, bcd = bcd,
                           n_screws = n_screws, d_circle = d_circle);
  }
}
module clamp_double(d_tube = 16, h_ring = 12, wall = 3, d_bolt = 4, offset = 1,
                    nut = true, d_nut = 8, h_nut = 4, coupling = false,
                    bcd = 10, n_screws = 4, d_circle = 2, center_to_center = 60,
                    orientations = [ 0, 0 ], reflections = [ false, true ],
                    bar_thickness = 8, bar_offset = 5, n_holes = 3,
                    hole_distance = 10, bar_orientation = 0) {
  difference() {
    union() {
      translate([ 0, center_to_center / 2, 0 ])
          rotate([ 0, 0, orientations[0] ])
              clamp_positive(d_tube = d_tube, h_ring = h_ring, wall = wall,
                             d_bolt = d_bolt, offset = offset);
      translate([ 0, -center_to_center / 2, 0 ])
          rotate([ 0, 0, orientations[1] ])
              clamp_positive(d_tube = d_tube, h_ring = h_ring, wall = wall,
                             d_bolt = d_bolt, offset = offset);
      translate([ bar_offset, 0, 0 ]) rotate([ 0, bar_orientation, 0 ]) bar(
          bar_thickness = bar_thickness, center_to_center = center_to_center,
          bar_width = h_ring, hole_distance = hole_distance, n_holes = n_holes,
          d_bolt = d_bolt, d_nut = d_nut, h_nut = h_nut);
    }
    translate([ 0, center_to_center / 2, 0 ]) rotate([ 0, 0, orientations[0] ])
        mirror([ 0, reflections[0] ? 1 : 0, 0 ])
            clamp_negative(d_tube = d_tube, h_ring = h_ring, wall = wall,
                           d_bolt = d_bolt, offset = offset, nut = nut,
                           d_nut = d_nut, coupling = coupling, bcd = bcd,
                           n_screws = n_screws, d_circle = d_circle);
    translate([ 0, -center_to_center / 2, 0 ]) rotate([ 0, 0, orientations[1] ])
        mirror([ 0, reflections[1] ? 1 : 0, 0 ])
            clamp_negative(d_tube = d_tube, h_ring = h_ring, wall = wall,
                           d_bolt = d_bolt, offset = offset, nut = nut,
                           d_nut = d_nut, coupling = coupling, bcd = bcd,
                           n_screws = n_screws, d_circle = d_circle);
  }
}

module clamp_double_side(d_tube = 16, h_ring = 12, wall = 3, d_bolt = 4,
                         offset = 1, nut = true, d_nut = 8, h_nut = 4,
                         coupling = false, bcd = 10, n_screws = 4, d_circle = 2,
                         center_to_center = 60, orientations = [ 0, 0 ],
                         reflections = [ false, true ], bar_thickness = 8,
                         bar_offset = 5, n_holes = 3, hole_distance = 10,
                         bar_orientation = 0) {
  difference() {
    union() {
      translate([ 0, center_to_center / 2, 0 ])
          rotate([ 0, 0, orientations[0] ])
              clamp_positive(d_tube = d_tube, h_ring = h_ring, wall = wall,
                             d_bolt = d_bolt, offset = offset);
      translate([ 0, -center_to_center / 2, 0 ])
          rotate([ 0, 0, orientations[1] ])
              clamp_positive(d_tube = d_tube, h_ring = h_ring, wall = wall,
                             d_bolt = d_bolt, offset = offset);
      translate([ bar_offset, 0, 0 ]) rotate([ 0, -90, 0 ])
          bar(bar_thickness = h_ring, center_to_center = center_to_center,
              bar_width = bar_thickness, hole_distance = hole_distance,
              n_holes = n_holes, d_bolt = d_bolt, d_nut = d_nut, h_nut = h_nut);
    }
    translate([ 0, center_to_center / 2, 0 ]) rotate([ 0, 0, orientations[0] ])
        mirror([ 0, reflections[0] ? 1 : 0, 0 ])
            clamp_negative(d_tube = d_tube, h_ring = h_ring, wall = wall,
                           d_bolt = d_bolt, offset = offset, nut = nut,
                           d_nut = d_nut, coupling = coupling, bcd = bcd,
                           n_screws = n_screws, d_circle = d_circle);
    translate([ 0, -center_to_center / 2, 0 ]) rotate([ 0, 0, orientations[1] ])
        mirror([ 0, reflections[1] ? 1 : 0, 0 ])
            clamp_negative(d_tube = d_tube, h_ring = h_ring, wall = wall,
                           d_bolt = d_bolt, offset = offset, nut = nut,
                           d_nut = d_nut, coupling = coupling, bcd = bcd,
                           n_screws = n_screws, d_circle = d_circle);
    translate([ bar_offset - bar_thickness / 2 - bissl, -width / 2, 0 ]) cube(
        [ bar_thickness + 2 * bissl, width + 2 * bissl, h_ring / 2 + bissl ]);
  }
}
module lens_support(range = 30, wall = 3, width = 20, maxlens = 82, h_ring = 16,
                    bissl = 1 / 100) {
  difference() {
    union() {
      points = [
        [ -range - 2 * wall, width / 2 - wall / 2 ],
        [ (width / 2 - wall / 2) / 2, width / 2 - wall / 2 ],
        [ (maxlens / 2) / 2, maxlens / 2 ], [ 0, 0 ],
        [ (maxlens / 2) / 2, -maxlens / 2 ],
        [ (width / 2 - wall / 2) / 2, wall / 2 - width / 2 ],
        [ -range - 2 * wall, wall / 2 - width / 2 ]
      ];
      for (i = [0:len(points) - 1])
        hull() {
          translate(points[i % len(points)]) cylinder(h = h_ring / 2, d = wall);
          translate(points[(i + 1) % len(points)])
              cylinder(h = h_ring / 2, d = wall);
        }
      linear_extrude(height = h_ring / 2, convexity = 4) polygon(points);
    }
    hull() {
      translate([ -range - wall, 0, -bissl ])
          cylinder(d = d_bolt, h = h_ring / 2 + 2 * bissl);
      translate([ -wall, 0, -bissl ])
          cylinder(d = d_bolt, h = h_ring / 2 + 2 * bissl);
    }
  }
}
if (part == "lens_support")
  lens_support(range = range, wall = wall, width = width, maxlens = maxlens,
               h_ring = h_ring);
if (part == "double_clamp_side")
  clamp_double_side(d_tube = d_tube, h_ring = h_ring, wall = wall,
                    d_bolt = d_bolt, offset = offset, nut = nut, d_nut = d_nut,
                    h_nut = h_nut, coupling = coupling, bcd = bcd,
                    n_screws = n_screws, d_circle = d_circle,
                    center_to_center = center_to_center,
                    orientations = orientations, reflections = reflections,
                    bar_thickness = bar_thickness, bar_offset = bar_offset,
                    n_holes = n_holes, hole_distance = hole_distance,
                    bar_orientation = bar_orientation);
if (part == "double_clamp")
  clamp_double(d_tube = d_tube, h_ring = h_ring, wall = wall, d_bolt = d_bolt,
               offset = offset, nut = nut, d_nut = d_nut, h_nut = h_nut,
               coupling = coupling, bcd = bcd, n_screws = n_screws,
               d_circle = d_circle, center_to_center = center_to_center,
               orientations = orientations, reflections = reflections,
               bar_thickness = bar_thickness, bar_offset = bar_offset,
               n_holes = n_holes, hole_distance = hole_distance,
               bar_orientation = bar_orientation);
if (part == "single_clamp")
  clamp(d_tube = d_tube, h_ring = h_ring, wall = wall, d_bolt = d_bolt,
        offset = offset, nut = nut, d_nut = d_nut, coupling = coupling,
        bcd = bcd, n_screws = n_screws, d_circle = d_circle);
if (part == "double_clamp_double_mount")
  double_double_clamp(d_tube = d_tube, h_ring = h_ring, wall = wall,
                      d_bolt = d_bolt, offset = offset, nut = nut,
                      d_nut = d_nut, h_nut = h_nut, coupling = coupling,
                      bcd = bcd, n_screws = n_screws, d_circle = d_circle,
                      center_to_center = center_to_center,
                      orientations = orientations, reflections = reflections,
                      bar_thickness = bar_thickness,
                      second_bar_offset = bar_offset, n_holes = n_holes,
                      hole_distance = hole_distance);
